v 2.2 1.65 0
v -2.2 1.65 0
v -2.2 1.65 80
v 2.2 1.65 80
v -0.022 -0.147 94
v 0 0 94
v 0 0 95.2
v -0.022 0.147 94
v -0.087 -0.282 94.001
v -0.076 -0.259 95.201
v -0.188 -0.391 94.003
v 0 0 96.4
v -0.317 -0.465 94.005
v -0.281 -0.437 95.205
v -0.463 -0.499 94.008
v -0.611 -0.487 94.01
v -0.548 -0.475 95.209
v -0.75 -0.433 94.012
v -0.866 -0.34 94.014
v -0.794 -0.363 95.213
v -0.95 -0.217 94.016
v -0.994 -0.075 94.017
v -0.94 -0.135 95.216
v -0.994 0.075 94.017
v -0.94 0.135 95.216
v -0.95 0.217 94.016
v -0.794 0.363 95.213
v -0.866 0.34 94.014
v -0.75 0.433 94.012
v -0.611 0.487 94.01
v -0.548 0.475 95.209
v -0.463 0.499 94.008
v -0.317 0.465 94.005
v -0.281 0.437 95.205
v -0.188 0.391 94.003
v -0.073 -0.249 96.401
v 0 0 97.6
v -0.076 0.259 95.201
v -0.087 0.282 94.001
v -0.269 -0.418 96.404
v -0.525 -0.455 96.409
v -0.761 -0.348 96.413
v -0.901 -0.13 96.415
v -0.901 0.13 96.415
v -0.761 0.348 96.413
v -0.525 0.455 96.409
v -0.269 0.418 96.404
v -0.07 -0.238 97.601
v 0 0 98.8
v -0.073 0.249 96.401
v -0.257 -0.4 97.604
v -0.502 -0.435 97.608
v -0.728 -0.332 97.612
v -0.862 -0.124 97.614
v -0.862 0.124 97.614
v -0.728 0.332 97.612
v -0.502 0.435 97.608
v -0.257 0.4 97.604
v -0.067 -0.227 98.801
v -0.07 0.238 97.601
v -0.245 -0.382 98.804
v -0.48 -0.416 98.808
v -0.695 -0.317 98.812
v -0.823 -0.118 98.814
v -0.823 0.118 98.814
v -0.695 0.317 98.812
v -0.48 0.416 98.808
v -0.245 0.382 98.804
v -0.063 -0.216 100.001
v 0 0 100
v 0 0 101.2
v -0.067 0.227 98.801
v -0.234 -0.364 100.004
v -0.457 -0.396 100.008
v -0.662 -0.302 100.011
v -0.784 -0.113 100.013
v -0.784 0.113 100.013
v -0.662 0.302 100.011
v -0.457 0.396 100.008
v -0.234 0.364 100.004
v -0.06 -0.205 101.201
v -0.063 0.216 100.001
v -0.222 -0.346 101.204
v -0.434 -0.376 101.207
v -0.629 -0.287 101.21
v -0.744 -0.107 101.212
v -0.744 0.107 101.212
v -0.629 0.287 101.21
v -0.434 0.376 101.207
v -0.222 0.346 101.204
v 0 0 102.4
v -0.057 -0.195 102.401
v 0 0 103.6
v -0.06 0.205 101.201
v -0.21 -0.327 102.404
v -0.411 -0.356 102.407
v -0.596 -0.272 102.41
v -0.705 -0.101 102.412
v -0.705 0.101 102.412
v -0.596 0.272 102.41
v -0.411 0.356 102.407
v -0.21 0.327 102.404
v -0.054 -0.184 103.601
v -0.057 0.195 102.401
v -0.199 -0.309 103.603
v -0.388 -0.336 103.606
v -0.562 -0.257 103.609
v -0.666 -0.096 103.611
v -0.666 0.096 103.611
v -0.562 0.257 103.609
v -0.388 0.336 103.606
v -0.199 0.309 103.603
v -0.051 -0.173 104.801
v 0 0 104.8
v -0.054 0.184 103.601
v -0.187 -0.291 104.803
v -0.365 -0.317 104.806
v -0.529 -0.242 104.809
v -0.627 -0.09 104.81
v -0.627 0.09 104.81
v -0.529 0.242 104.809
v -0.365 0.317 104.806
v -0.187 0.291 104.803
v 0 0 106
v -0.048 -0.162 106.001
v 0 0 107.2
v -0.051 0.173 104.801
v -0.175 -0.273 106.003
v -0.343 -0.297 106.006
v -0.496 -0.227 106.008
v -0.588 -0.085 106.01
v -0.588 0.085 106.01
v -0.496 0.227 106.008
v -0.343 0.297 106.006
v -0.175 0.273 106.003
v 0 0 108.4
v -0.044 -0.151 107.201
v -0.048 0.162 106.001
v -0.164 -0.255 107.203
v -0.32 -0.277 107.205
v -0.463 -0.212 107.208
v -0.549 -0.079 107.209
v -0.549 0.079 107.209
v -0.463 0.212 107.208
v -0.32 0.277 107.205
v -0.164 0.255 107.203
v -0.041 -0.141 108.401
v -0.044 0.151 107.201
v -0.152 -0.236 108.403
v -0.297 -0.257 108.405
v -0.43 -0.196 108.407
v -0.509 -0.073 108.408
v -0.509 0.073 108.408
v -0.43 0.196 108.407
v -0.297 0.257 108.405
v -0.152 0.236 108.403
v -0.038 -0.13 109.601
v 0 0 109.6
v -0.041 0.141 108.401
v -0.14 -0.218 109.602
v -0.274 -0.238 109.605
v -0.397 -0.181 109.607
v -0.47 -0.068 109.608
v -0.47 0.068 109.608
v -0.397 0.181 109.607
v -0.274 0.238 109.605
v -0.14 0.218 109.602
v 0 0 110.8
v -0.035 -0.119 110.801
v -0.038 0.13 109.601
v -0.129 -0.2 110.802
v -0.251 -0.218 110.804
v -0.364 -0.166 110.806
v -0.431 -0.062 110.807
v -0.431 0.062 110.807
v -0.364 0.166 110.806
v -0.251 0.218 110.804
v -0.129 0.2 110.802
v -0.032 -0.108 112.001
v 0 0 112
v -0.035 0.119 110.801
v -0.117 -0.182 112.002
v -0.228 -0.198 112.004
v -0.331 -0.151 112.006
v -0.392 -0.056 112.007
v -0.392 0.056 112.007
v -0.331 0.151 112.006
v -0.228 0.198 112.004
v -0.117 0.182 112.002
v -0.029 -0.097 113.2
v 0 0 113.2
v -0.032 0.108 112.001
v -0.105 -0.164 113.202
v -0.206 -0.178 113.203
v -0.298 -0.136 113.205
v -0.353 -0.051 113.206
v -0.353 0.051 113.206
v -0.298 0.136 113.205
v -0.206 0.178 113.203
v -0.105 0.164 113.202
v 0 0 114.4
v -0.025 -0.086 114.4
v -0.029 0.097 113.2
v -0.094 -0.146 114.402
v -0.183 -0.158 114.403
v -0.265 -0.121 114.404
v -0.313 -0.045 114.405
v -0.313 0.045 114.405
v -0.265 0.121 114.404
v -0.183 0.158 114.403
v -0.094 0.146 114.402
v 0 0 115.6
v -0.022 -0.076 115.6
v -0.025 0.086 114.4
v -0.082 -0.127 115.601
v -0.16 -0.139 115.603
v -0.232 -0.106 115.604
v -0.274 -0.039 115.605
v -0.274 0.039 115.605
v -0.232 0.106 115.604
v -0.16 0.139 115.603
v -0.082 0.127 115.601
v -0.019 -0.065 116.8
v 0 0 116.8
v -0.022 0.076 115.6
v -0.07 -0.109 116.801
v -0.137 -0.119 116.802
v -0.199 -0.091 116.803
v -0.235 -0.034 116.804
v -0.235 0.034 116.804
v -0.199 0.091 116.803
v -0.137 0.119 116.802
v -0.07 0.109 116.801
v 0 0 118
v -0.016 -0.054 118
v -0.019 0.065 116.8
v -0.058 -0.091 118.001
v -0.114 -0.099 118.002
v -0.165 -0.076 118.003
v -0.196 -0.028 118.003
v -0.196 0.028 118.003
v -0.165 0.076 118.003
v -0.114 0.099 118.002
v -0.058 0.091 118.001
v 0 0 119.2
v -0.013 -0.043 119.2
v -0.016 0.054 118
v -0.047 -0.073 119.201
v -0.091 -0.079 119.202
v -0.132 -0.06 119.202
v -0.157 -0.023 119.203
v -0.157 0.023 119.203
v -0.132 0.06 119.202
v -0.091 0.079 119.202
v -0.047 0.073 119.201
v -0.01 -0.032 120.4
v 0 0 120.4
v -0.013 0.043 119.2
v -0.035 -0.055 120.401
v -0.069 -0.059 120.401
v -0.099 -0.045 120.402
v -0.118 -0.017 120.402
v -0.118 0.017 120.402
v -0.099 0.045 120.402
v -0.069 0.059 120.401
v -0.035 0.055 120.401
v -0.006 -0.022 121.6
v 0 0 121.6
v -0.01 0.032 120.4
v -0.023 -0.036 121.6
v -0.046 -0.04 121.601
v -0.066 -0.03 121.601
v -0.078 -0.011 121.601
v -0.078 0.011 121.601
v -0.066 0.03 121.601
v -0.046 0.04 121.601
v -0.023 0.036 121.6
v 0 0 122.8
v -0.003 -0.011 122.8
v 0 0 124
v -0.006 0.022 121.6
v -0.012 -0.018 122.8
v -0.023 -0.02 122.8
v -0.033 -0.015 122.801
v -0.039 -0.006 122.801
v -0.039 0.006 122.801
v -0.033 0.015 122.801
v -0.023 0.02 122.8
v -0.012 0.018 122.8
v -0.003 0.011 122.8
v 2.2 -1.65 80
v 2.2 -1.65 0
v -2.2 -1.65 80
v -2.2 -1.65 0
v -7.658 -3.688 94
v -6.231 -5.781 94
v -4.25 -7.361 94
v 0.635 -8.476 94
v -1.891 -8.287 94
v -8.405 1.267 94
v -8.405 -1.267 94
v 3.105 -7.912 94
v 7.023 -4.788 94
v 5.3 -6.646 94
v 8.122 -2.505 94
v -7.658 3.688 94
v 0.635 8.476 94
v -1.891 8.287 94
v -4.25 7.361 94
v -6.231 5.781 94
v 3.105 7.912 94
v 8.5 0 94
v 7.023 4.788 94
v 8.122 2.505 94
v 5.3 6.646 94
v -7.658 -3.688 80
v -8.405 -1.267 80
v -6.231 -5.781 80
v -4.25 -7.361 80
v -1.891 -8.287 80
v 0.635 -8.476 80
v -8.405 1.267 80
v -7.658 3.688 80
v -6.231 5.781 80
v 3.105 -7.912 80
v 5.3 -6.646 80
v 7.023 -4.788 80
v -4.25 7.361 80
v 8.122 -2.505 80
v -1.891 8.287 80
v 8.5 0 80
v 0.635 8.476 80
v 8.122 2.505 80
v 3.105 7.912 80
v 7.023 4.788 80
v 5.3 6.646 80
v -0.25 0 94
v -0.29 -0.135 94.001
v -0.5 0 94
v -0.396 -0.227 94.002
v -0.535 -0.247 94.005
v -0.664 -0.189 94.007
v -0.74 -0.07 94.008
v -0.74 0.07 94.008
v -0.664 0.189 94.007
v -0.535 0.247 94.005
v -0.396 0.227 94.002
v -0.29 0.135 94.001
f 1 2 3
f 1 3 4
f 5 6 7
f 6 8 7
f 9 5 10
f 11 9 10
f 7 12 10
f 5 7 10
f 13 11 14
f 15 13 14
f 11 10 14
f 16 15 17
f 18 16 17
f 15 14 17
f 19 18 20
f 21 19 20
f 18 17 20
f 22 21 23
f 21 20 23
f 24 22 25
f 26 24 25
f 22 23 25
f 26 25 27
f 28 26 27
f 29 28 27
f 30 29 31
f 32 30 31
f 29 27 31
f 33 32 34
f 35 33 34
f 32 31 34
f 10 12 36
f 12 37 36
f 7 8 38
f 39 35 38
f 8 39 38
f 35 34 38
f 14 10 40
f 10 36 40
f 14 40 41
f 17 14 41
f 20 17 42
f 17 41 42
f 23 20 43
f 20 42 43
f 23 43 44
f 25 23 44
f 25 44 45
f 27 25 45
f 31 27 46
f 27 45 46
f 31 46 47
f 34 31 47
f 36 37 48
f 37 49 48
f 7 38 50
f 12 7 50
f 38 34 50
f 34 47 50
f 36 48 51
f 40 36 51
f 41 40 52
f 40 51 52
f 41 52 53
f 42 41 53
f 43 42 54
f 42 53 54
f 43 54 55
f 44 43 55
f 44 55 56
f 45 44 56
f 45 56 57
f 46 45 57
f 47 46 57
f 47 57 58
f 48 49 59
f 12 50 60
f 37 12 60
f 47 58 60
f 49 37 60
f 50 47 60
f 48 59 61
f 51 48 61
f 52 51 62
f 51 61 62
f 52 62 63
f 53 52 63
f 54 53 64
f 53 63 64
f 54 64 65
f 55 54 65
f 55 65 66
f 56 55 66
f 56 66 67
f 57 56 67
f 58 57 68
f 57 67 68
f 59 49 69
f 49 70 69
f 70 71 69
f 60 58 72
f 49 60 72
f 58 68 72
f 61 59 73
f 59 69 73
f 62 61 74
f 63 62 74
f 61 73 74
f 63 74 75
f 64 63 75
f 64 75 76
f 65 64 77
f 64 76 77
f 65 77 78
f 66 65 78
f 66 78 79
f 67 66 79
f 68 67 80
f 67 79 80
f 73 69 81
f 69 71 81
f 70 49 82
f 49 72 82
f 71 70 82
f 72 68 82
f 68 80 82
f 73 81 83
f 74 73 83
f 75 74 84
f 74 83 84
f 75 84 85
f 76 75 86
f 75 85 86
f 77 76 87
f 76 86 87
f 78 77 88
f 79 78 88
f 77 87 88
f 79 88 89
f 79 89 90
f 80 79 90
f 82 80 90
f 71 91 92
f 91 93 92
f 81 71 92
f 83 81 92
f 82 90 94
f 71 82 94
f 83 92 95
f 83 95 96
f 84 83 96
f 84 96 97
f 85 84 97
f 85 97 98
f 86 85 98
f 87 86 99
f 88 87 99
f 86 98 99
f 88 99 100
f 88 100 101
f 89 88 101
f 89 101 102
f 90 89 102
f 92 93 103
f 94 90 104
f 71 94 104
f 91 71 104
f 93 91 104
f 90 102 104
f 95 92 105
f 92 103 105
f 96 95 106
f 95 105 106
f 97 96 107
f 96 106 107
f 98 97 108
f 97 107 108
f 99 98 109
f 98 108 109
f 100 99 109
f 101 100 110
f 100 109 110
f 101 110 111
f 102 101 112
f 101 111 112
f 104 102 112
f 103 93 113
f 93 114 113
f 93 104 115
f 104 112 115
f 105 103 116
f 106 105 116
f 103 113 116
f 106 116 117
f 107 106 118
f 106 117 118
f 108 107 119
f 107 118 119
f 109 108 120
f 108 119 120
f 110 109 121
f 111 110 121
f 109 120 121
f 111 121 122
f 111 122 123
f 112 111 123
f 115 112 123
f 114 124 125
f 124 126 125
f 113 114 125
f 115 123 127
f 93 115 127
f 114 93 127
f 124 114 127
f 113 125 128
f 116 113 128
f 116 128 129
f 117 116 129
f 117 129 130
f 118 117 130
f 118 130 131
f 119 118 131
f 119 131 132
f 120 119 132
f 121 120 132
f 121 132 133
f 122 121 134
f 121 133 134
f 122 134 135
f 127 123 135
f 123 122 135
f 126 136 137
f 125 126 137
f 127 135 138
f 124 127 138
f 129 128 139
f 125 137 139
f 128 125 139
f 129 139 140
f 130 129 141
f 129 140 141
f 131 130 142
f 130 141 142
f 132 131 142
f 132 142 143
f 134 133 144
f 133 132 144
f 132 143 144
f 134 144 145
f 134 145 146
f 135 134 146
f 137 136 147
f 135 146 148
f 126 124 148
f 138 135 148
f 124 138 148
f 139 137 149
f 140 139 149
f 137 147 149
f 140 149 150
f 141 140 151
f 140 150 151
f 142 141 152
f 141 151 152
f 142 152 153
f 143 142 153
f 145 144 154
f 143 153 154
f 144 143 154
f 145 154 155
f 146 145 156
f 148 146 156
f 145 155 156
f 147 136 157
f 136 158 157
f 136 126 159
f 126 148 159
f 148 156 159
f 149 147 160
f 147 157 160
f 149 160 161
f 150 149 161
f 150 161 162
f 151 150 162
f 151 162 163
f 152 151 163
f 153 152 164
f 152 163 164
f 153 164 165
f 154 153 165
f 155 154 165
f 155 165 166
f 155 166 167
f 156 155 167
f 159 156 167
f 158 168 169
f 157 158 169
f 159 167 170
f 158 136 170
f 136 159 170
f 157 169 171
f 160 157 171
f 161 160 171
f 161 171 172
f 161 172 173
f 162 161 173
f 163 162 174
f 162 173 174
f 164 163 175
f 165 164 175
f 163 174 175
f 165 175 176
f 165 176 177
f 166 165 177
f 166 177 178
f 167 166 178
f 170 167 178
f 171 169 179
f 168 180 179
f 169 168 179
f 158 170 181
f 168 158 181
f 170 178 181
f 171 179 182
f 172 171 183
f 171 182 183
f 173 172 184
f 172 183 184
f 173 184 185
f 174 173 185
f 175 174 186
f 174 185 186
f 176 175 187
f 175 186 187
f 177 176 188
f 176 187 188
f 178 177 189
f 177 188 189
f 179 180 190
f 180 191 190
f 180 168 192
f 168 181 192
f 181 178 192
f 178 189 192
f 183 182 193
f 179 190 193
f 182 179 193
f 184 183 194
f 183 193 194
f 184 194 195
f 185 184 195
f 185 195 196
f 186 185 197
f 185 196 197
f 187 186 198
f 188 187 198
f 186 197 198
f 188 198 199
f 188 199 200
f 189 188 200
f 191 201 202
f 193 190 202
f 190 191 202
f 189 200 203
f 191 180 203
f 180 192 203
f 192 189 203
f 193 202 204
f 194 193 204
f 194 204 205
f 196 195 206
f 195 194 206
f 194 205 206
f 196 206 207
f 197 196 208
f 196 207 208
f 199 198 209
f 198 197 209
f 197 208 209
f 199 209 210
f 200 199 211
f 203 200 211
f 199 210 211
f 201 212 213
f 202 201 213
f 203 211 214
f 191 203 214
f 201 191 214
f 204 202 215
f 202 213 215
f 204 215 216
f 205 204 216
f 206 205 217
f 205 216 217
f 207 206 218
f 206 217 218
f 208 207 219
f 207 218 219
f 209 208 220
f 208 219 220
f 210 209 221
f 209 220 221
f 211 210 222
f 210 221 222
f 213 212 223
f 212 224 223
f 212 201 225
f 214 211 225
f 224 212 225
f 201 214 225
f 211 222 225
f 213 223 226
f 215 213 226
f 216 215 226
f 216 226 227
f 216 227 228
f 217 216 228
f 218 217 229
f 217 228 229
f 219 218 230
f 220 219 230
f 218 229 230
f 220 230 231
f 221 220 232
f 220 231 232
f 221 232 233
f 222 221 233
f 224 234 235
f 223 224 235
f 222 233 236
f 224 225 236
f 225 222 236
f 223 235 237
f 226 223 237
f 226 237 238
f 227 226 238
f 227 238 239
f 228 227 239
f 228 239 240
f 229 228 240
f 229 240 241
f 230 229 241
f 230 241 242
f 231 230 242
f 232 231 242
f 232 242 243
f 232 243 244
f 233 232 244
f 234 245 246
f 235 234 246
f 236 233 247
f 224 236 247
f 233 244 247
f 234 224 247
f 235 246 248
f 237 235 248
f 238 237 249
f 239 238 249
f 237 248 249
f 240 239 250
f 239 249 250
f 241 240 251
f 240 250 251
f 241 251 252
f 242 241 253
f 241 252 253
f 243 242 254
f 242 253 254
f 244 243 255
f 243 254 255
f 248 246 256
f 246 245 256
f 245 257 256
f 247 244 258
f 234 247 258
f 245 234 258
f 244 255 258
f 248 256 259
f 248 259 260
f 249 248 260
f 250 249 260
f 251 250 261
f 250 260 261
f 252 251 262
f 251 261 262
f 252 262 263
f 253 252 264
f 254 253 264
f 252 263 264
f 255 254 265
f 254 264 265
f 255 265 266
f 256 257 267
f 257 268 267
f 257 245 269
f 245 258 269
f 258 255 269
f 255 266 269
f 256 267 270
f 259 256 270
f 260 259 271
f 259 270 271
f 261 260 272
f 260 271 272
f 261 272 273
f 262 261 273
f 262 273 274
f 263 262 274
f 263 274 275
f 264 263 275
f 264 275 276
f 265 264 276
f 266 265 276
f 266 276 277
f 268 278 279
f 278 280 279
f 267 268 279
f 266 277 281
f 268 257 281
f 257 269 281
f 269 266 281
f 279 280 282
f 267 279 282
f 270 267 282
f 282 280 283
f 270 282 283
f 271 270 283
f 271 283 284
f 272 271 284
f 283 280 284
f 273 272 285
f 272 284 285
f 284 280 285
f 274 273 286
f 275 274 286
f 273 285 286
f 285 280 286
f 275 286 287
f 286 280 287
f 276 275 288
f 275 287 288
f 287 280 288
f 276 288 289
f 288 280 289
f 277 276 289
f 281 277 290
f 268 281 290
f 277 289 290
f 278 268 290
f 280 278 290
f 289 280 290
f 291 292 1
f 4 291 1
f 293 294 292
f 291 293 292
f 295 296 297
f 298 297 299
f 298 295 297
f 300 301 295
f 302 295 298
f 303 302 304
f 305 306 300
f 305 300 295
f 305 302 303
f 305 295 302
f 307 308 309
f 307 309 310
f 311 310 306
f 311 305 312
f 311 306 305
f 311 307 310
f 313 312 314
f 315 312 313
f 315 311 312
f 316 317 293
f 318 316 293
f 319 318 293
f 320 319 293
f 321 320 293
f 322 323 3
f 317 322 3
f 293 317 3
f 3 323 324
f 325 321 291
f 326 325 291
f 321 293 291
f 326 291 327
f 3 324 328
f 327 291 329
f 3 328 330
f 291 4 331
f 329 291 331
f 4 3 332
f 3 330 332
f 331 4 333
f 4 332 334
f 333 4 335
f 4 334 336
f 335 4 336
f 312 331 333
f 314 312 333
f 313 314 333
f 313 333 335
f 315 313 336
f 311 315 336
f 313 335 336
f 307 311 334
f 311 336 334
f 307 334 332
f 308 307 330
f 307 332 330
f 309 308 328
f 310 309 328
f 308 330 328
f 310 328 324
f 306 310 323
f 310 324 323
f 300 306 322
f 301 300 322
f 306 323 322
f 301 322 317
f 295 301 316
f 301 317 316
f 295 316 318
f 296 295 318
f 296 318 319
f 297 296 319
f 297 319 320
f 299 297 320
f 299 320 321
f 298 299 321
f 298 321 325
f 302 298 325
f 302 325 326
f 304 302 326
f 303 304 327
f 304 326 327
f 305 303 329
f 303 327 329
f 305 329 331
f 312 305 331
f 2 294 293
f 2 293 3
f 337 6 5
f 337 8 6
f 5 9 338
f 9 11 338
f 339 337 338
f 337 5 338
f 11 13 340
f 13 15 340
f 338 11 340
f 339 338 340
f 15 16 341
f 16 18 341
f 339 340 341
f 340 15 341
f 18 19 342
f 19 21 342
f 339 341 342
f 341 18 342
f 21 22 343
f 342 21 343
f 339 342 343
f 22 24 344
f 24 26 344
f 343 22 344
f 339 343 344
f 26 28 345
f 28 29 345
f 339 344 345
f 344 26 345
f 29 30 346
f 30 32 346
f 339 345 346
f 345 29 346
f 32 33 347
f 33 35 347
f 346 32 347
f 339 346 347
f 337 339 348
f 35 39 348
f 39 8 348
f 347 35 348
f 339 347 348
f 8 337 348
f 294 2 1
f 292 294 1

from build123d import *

# Parameters (mm, degrees)
SKETCH1_W           = 4.4
SKETCH1_H           = 3.3
BOSS_EXTRUDE1_DEPTH = 80
SKETCH2_R           = 8.5
BOSS_EXTRUDE2_DEPTH = 14


with BuildPart() as part:
    # Sketch1 → Boss-Extrude1 (new body)
    with BuildSketch(Plane.XY):
        Rectangle(SKETCH1_W, SKETCH1_H)
    extrude(amount=BOSS_EXTRUDE1_DEPTH)

    # Sketch2 → Boss-Extrude2 (add)
    with BuildSketch(Plane.XY.offset(80)):
        Circle(SKETCH2_R)
    extrude(amount=BOSS_EXTRUDE2_DEPTH)


with BuildPart() as body_2:
    # Sketch3 → Revolve1 (revolve)
    with BuildSketch(Plane(origin=(0, 0, 0), x_dir=(1, 0, 0), z_dir=(0, 1, 0))):
        Polygon((0, -94), (0, -124), (-0.5, -94), align=None)
    revolve(axis=Axis((0, 0, 124), (-0.016664352333993458, 0, -0.9998611400396)))


solid = Compound([part.part, body_2.part])
